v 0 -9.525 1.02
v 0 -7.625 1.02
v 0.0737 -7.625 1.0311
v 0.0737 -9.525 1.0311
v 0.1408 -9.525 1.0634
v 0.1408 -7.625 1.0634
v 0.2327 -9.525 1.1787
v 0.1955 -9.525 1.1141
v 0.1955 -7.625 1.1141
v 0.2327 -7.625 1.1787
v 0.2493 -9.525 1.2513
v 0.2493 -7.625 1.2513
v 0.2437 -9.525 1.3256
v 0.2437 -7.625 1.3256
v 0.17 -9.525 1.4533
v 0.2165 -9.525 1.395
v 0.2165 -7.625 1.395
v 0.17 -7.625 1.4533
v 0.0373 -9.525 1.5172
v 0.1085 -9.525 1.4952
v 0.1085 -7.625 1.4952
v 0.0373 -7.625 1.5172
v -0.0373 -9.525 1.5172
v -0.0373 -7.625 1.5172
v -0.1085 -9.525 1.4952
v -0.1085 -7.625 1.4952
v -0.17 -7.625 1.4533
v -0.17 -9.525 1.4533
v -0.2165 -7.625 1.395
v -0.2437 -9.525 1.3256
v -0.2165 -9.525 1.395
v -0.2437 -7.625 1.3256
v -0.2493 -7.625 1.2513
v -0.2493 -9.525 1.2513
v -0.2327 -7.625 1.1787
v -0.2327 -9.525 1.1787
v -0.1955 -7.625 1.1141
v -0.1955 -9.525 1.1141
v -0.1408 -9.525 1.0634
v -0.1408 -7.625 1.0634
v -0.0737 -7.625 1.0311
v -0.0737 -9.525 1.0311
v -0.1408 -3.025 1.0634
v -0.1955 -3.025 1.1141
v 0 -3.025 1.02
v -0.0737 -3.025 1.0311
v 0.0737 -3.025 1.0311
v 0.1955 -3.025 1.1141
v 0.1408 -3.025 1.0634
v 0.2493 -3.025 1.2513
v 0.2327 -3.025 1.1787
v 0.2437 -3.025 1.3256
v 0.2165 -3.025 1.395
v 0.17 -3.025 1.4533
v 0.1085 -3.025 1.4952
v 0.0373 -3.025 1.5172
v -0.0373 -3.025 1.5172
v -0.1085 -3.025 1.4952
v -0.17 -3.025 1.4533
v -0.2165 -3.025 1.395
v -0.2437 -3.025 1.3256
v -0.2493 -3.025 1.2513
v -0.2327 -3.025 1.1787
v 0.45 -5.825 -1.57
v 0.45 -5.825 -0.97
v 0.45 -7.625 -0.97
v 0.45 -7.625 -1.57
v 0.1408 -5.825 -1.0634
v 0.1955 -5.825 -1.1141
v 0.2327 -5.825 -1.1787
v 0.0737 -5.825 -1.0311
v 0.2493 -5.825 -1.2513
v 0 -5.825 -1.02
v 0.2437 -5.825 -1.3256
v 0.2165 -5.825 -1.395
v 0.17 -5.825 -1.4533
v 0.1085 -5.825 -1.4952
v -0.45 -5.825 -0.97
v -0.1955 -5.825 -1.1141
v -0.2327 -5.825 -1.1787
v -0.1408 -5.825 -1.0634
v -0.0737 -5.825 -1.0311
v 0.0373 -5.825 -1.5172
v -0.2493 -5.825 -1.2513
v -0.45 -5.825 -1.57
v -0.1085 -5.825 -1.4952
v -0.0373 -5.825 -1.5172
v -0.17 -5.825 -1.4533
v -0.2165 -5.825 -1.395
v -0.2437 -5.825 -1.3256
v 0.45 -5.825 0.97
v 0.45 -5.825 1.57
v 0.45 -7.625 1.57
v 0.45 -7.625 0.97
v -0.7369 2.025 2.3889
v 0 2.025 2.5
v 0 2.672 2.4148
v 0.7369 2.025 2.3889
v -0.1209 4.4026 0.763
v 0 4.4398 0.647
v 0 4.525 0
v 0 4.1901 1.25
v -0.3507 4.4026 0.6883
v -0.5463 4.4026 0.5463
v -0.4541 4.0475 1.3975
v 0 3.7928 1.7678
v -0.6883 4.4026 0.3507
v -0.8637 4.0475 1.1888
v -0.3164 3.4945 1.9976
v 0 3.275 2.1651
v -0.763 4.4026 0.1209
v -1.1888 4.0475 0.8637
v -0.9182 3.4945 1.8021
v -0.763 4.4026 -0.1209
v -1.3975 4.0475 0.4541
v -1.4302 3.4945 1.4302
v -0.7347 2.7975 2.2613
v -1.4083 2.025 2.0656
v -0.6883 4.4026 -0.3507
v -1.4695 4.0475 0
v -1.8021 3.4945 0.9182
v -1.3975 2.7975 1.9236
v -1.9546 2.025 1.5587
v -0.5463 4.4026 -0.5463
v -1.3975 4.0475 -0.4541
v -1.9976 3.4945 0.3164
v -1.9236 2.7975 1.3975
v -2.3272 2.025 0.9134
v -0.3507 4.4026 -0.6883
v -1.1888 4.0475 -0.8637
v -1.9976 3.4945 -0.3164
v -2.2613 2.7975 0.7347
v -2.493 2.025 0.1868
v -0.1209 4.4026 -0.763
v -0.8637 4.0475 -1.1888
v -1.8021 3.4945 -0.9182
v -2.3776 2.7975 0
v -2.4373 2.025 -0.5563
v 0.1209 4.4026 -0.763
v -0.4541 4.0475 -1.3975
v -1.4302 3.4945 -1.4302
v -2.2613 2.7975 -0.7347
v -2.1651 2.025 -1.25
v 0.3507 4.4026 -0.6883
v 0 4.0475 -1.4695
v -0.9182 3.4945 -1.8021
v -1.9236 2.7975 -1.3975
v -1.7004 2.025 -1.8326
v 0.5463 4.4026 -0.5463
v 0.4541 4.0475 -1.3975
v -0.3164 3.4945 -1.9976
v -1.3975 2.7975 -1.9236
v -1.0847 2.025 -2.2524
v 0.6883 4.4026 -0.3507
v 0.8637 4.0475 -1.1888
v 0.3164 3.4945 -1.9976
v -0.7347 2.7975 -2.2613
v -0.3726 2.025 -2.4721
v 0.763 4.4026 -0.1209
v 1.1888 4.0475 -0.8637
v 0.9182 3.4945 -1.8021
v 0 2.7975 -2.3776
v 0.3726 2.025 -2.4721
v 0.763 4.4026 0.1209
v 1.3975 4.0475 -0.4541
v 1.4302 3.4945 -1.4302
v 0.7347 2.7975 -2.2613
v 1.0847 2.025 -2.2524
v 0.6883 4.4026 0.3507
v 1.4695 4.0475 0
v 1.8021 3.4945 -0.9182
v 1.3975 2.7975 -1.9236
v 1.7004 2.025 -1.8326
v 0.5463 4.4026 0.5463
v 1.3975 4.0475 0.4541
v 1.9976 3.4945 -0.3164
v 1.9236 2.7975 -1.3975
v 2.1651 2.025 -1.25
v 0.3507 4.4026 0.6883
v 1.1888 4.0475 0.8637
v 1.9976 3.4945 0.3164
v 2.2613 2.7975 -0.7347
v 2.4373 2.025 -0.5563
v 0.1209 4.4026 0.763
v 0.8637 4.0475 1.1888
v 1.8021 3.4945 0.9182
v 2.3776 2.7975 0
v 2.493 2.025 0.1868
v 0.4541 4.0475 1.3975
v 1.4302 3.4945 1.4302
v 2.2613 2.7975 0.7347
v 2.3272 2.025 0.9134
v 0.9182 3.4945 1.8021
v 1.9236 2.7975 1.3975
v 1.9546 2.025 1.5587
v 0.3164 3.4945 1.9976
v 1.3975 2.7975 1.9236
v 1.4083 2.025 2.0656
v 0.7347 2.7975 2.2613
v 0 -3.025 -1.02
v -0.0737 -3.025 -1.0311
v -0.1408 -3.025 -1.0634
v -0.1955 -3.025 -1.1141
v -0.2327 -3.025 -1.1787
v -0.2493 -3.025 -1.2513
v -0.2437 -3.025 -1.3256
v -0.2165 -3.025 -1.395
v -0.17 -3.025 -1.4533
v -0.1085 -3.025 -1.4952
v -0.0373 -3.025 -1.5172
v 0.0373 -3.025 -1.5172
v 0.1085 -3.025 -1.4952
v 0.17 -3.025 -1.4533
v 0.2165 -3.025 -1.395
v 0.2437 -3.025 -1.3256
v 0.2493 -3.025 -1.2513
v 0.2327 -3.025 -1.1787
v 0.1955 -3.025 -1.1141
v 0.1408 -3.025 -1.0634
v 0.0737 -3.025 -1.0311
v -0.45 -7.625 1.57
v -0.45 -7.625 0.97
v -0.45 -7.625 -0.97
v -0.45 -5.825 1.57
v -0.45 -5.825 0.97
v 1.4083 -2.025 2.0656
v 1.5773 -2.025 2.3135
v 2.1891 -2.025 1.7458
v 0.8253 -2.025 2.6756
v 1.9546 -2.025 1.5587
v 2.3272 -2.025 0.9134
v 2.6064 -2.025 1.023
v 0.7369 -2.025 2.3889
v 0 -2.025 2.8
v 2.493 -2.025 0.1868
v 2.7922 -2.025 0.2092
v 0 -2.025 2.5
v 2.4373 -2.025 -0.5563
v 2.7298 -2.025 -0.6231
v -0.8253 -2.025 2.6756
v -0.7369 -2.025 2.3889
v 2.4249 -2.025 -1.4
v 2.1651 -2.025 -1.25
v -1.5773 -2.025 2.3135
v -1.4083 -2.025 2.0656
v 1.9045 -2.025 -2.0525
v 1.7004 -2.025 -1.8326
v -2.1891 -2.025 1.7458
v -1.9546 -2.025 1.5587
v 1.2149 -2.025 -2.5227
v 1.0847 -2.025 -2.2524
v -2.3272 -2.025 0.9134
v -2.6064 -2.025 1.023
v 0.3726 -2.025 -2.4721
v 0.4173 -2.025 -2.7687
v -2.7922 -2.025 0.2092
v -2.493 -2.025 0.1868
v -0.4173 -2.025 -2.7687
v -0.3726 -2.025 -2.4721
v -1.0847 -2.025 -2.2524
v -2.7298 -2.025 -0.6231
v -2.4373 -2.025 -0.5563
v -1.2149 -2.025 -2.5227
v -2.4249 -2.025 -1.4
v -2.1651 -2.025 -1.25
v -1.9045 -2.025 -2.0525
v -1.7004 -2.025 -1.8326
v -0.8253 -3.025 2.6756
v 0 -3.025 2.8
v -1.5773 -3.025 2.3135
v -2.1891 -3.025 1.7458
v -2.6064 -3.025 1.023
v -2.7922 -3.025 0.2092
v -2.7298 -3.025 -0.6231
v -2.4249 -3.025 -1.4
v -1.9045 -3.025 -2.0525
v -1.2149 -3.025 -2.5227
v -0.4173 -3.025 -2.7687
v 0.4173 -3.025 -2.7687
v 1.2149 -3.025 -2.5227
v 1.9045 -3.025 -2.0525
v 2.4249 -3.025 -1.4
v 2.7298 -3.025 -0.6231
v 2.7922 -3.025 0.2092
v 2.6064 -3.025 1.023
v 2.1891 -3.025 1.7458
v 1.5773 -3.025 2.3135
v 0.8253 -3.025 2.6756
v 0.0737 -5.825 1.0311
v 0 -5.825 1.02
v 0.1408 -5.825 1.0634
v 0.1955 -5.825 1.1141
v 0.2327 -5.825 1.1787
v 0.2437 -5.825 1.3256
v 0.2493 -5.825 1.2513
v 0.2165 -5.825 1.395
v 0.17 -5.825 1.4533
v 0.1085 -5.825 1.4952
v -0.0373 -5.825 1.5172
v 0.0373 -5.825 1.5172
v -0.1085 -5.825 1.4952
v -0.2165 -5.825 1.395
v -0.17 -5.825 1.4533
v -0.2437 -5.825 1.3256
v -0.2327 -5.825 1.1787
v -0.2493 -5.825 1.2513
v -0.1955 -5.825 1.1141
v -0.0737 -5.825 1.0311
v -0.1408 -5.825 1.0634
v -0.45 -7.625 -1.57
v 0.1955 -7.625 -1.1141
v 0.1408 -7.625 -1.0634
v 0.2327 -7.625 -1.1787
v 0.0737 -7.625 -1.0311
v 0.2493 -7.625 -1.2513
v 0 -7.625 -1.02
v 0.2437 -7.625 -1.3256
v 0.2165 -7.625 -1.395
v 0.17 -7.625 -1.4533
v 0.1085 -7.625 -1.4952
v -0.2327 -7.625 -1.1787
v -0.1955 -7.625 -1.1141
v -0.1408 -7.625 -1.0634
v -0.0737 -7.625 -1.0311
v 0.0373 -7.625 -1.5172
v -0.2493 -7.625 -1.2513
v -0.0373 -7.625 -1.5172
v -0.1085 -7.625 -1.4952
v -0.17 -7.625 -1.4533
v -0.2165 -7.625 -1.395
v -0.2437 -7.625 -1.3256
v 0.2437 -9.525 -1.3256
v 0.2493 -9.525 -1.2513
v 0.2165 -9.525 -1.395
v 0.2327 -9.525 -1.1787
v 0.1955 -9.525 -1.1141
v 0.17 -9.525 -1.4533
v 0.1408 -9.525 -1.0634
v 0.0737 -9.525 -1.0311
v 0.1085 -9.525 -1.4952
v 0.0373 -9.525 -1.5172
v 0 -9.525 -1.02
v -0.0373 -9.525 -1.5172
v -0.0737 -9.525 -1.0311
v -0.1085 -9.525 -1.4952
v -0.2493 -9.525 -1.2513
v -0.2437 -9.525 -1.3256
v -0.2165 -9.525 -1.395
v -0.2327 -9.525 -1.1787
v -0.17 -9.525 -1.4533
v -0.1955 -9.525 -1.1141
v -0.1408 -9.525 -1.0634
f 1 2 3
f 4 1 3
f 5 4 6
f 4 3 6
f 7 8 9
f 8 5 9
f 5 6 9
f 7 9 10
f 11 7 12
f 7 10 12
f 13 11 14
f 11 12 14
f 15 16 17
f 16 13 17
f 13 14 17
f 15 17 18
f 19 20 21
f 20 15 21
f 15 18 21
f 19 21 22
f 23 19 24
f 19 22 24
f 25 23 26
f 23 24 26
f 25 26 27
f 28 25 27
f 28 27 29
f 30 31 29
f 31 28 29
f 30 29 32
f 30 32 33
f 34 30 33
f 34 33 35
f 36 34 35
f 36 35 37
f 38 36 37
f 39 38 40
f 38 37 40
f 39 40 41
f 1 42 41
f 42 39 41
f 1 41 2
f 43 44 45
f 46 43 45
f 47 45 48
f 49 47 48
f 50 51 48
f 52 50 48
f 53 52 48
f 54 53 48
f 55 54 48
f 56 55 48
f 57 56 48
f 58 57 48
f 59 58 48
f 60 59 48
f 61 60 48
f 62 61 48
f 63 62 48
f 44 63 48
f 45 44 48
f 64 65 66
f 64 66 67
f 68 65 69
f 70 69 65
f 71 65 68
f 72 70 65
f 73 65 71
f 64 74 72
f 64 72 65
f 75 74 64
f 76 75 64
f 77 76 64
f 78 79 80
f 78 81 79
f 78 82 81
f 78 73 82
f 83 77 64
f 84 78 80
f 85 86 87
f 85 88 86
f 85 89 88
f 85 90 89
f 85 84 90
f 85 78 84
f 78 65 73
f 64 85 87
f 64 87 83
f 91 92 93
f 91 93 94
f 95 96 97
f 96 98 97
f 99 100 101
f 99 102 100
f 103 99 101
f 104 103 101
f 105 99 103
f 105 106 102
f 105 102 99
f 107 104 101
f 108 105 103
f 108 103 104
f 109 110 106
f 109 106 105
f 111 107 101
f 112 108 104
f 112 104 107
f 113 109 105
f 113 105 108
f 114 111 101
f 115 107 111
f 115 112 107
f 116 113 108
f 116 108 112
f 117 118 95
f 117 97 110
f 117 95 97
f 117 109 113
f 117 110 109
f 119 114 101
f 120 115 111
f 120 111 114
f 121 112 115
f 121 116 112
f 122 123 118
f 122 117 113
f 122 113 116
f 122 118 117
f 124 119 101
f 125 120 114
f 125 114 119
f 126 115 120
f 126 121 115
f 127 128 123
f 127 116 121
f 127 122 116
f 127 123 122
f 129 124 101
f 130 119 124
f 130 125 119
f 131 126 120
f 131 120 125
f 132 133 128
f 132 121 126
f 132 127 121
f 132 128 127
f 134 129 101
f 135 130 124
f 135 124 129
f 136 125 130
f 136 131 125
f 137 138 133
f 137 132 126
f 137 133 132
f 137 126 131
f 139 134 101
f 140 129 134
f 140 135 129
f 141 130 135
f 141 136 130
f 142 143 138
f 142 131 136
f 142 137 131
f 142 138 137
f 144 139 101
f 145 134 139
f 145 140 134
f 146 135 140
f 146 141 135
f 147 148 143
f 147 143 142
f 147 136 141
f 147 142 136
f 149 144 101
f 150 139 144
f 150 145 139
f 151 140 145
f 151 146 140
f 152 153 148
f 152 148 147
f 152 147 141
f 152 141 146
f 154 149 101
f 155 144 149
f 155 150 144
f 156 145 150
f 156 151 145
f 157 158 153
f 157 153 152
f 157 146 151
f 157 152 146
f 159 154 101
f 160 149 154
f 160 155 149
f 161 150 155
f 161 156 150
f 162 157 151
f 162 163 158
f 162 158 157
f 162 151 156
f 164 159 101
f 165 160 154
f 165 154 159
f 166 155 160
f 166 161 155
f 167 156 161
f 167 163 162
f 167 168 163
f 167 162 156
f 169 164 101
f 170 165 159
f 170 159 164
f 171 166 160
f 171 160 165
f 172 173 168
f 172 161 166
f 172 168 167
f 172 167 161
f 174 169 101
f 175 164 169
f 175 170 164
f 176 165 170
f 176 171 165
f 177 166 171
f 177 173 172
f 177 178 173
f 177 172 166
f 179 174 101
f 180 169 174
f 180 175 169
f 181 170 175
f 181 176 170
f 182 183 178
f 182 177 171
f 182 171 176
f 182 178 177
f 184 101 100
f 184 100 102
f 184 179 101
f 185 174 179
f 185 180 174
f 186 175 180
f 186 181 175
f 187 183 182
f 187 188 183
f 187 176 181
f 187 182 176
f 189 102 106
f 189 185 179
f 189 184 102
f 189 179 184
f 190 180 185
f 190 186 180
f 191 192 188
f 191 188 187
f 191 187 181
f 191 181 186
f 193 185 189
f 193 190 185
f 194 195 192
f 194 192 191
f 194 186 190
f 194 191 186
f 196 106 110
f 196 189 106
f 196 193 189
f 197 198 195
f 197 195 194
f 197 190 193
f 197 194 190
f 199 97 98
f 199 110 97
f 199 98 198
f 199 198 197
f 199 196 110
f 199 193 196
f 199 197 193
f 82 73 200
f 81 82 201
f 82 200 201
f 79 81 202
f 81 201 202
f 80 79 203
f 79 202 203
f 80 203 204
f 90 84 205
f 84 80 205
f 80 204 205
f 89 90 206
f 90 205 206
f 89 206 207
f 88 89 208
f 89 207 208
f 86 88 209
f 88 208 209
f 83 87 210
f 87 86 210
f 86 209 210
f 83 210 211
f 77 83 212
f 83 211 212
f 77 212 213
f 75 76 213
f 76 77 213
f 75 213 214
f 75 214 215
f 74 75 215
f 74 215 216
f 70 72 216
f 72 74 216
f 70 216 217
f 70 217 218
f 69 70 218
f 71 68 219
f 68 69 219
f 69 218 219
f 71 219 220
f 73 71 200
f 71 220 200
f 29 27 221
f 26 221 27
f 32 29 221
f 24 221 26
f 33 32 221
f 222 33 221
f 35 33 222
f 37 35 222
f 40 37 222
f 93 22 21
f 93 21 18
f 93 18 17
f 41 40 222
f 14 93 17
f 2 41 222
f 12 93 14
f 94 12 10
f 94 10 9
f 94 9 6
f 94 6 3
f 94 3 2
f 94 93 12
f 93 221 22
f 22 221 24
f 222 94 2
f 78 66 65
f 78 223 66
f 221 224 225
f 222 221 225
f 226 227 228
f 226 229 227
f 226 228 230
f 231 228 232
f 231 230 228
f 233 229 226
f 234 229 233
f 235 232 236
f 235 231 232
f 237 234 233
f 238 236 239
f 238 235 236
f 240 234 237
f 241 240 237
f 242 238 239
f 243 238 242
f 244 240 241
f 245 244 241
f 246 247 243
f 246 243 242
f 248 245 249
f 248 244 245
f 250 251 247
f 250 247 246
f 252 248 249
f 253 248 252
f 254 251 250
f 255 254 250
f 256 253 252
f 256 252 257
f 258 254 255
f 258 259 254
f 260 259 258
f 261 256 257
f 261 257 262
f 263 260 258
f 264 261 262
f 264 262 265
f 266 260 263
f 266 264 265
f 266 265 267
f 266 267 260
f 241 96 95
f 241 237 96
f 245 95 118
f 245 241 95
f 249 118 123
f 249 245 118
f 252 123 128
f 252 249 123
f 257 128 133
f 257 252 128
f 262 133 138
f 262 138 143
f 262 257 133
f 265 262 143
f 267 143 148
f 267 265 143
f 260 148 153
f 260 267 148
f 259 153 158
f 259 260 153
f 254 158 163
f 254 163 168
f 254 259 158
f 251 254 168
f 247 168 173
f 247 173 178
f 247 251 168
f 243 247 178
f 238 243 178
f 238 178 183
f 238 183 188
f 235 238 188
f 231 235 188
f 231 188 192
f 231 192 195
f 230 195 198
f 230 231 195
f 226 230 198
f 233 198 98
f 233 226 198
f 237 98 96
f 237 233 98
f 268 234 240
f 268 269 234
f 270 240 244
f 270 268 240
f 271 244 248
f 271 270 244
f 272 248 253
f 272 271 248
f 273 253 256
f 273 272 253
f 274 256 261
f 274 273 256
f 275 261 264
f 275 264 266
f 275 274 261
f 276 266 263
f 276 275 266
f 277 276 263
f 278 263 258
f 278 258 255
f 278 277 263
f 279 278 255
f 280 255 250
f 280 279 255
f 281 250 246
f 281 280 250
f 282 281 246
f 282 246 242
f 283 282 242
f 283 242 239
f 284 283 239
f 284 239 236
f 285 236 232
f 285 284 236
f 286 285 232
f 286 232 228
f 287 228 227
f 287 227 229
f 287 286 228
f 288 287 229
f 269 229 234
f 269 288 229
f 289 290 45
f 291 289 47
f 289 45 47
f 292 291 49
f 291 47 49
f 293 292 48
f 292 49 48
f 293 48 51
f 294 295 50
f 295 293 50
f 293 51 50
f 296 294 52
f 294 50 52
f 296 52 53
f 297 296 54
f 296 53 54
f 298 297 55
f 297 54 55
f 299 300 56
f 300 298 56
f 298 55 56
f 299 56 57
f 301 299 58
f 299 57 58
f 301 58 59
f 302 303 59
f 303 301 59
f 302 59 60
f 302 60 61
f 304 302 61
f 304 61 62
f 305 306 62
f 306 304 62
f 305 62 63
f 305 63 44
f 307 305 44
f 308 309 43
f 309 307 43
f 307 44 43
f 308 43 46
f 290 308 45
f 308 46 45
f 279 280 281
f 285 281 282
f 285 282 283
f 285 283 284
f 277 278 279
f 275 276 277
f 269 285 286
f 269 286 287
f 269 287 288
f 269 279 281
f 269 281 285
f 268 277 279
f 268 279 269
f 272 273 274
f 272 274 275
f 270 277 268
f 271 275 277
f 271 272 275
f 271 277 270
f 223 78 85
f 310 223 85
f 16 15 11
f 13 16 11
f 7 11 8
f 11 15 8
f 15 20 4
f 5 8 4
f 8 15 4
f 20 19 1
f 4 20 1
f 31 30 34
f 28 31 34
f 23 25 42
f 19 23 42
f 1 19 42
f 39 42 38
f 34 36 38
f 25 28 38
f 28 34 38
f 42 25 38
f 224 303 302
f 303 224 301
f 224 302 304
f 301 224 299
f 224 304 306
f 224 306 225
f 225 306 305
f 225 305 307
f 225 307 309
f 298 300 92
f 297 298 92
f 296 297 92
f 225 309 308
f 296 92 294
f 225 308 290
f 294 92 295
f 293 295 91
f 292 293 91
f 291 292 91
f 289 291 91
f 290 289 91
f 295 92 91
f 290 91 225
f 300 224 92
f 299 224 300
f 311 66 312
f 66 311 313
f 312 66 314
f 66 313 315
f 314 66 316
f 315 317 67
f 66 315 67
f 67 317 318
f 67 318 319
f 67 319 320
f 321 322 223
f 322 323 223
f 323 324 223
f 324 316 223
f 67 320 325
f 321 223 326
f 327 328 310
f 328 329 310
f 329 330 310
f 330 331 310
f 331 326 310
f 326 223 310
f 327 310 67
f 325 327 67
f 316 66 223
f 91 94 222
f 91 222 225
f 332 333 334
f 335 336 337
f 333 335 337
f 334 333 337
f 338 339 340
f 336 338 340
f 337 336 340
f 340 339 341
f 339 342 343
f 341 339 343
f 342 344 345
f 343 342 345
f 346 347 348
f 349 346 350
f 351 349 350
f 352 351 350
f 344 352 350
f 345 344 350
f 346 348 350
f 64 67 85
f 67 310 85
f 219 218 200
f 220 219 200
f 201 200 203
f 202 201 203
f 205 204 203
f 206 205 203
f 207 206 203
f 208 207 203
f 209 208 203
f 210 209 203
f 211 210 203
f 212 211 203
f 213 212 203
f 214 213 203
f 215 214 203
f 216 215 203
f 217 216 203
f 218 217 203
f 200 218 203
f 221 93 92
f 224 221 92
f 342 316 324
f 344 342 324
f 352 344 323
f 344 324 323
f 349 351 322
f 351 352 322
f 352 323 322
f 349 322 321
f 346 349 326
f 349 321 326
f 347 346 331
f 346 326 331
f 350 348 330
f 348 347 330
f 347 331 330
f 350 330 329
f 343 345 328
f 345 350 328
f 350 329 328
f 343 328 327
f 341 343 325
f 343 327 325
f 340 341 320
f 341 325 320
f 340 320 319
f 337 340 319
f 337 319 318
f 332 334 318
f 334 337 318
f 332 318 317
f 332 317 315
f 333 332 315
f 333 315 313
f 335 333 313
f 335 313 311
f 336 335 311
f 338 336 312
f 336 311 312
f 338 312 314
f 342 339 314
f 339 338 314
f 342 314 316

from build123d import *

# Parameters (mm, degrees)
SKETCH2_R               = 0.25
BOSS_EXTRUDE1_DEPTH     = 11
BOSS_EXTRUDE1_2_DEPTH   = 11
SKETCH3_W               = 0.6
SKETCH3_H               = 1.8
BOSS_EXTRUDE2_DEPTH     = 0.45
CUT_EXTRUDE1_DEPTH      = 15.573284633
CUT_EXTRUDE1_DEPTH_BACK = 15.573284633
SKETCH4_W               = 5.043889868
SKETCH4_H               = 6.467062113


with BuildPart() as part:
    # Sketch1 → Revolve1 (revolve)
    with BuildSketch(Plane(origin=(0, 0, 0), x_dir=(0, 0, -1), z_dir=(1, 0, 0))):
        with BuildLine():
            Line((-2.5, 2.025), (-2.5, -2.025))
            Line((-2.5, -2.025), (-2.8, -2.025))
            Line((-2.8, -2.025), (-2.8, -3.025))
            Line((-2.8, -3.025), (0, -3.025))
            Line((0, -3.025), (0, 4.525))
            ThreePointArc((0, 4.525), (-1.767766953, 3.792766953), (-2.5, 2.025))
        make_face()
    revolve(axis=Axis((0, 4.525, 0), (0, -1, 0)))


with BuildPart() as body_2:
    # Sketch2 → Boss-Extrude1 (new body)
    with BuildSketch(Plane.XZ.offset(3.025)):
        with Locations(Location((0, 1.27, 0), (0, 0, 270))):
            Circle(SKETCH2_R)
    extrude(amount=BOSS_EXTRUDE1_DEPTH)



with BuildPart() as body_3:
    # Sketch2 → Boss-Extrude1 2 (new body)
    with BuildSketch(Plane.XZ.offset(3.025)):
        with Locations(Location((0, -1.27, 0), (0, 0, 90))):
            Circle(SKETCH2_R)
    extrude(amount=BOSS_EXTRUDE1_2_DEPTH)


with BuildPart() as body_2_1:
    add(body_2.part)

    add(body_3.part)  # Boss-Extrude2 merges body 3
    # Sketch3 → Boss-Extrude2 (add, symmetric)
    with BuildSketch(Plane(origin=(0, 0, 0), x_dir=(0, 0, -1), z_dir=(1, 0, 0))):
        with Locations((1.27, -6.725)):
            Rectangle(SKETCH3_W, SKETCH3_H)
        with Locations((-1.27, -6.725)):
            Rectangle(SKETCH3_W, SKETCH3_H)
    extrude(amount=BOSS_EXTRUDE2_DEPTH, both=True)

    # Sketch4 → Cut-Extrude1 (cut, two sides: drawn at the far end of the back side and taken through both)
    with BuildSketch(Plane(origin=(0, 0, 0), x_dir=(0, 0, -1), z_dir=(1, 0, 0)).offset(-CUT_EXTRUDE1_DEPTH_BACK)):
        with Locations((0.376722065, -12.758531057)):
            Rectangle(SKETCH4_W, SKETCH4_H)
    extrude(amount=CUT_EXTRUDE1_DEPTH + CUT_EXTRUDE1_DEPTH_BACK, mode=Mode.SUBTRACT)


solid = Compound([part.part, body_2_1.part])
